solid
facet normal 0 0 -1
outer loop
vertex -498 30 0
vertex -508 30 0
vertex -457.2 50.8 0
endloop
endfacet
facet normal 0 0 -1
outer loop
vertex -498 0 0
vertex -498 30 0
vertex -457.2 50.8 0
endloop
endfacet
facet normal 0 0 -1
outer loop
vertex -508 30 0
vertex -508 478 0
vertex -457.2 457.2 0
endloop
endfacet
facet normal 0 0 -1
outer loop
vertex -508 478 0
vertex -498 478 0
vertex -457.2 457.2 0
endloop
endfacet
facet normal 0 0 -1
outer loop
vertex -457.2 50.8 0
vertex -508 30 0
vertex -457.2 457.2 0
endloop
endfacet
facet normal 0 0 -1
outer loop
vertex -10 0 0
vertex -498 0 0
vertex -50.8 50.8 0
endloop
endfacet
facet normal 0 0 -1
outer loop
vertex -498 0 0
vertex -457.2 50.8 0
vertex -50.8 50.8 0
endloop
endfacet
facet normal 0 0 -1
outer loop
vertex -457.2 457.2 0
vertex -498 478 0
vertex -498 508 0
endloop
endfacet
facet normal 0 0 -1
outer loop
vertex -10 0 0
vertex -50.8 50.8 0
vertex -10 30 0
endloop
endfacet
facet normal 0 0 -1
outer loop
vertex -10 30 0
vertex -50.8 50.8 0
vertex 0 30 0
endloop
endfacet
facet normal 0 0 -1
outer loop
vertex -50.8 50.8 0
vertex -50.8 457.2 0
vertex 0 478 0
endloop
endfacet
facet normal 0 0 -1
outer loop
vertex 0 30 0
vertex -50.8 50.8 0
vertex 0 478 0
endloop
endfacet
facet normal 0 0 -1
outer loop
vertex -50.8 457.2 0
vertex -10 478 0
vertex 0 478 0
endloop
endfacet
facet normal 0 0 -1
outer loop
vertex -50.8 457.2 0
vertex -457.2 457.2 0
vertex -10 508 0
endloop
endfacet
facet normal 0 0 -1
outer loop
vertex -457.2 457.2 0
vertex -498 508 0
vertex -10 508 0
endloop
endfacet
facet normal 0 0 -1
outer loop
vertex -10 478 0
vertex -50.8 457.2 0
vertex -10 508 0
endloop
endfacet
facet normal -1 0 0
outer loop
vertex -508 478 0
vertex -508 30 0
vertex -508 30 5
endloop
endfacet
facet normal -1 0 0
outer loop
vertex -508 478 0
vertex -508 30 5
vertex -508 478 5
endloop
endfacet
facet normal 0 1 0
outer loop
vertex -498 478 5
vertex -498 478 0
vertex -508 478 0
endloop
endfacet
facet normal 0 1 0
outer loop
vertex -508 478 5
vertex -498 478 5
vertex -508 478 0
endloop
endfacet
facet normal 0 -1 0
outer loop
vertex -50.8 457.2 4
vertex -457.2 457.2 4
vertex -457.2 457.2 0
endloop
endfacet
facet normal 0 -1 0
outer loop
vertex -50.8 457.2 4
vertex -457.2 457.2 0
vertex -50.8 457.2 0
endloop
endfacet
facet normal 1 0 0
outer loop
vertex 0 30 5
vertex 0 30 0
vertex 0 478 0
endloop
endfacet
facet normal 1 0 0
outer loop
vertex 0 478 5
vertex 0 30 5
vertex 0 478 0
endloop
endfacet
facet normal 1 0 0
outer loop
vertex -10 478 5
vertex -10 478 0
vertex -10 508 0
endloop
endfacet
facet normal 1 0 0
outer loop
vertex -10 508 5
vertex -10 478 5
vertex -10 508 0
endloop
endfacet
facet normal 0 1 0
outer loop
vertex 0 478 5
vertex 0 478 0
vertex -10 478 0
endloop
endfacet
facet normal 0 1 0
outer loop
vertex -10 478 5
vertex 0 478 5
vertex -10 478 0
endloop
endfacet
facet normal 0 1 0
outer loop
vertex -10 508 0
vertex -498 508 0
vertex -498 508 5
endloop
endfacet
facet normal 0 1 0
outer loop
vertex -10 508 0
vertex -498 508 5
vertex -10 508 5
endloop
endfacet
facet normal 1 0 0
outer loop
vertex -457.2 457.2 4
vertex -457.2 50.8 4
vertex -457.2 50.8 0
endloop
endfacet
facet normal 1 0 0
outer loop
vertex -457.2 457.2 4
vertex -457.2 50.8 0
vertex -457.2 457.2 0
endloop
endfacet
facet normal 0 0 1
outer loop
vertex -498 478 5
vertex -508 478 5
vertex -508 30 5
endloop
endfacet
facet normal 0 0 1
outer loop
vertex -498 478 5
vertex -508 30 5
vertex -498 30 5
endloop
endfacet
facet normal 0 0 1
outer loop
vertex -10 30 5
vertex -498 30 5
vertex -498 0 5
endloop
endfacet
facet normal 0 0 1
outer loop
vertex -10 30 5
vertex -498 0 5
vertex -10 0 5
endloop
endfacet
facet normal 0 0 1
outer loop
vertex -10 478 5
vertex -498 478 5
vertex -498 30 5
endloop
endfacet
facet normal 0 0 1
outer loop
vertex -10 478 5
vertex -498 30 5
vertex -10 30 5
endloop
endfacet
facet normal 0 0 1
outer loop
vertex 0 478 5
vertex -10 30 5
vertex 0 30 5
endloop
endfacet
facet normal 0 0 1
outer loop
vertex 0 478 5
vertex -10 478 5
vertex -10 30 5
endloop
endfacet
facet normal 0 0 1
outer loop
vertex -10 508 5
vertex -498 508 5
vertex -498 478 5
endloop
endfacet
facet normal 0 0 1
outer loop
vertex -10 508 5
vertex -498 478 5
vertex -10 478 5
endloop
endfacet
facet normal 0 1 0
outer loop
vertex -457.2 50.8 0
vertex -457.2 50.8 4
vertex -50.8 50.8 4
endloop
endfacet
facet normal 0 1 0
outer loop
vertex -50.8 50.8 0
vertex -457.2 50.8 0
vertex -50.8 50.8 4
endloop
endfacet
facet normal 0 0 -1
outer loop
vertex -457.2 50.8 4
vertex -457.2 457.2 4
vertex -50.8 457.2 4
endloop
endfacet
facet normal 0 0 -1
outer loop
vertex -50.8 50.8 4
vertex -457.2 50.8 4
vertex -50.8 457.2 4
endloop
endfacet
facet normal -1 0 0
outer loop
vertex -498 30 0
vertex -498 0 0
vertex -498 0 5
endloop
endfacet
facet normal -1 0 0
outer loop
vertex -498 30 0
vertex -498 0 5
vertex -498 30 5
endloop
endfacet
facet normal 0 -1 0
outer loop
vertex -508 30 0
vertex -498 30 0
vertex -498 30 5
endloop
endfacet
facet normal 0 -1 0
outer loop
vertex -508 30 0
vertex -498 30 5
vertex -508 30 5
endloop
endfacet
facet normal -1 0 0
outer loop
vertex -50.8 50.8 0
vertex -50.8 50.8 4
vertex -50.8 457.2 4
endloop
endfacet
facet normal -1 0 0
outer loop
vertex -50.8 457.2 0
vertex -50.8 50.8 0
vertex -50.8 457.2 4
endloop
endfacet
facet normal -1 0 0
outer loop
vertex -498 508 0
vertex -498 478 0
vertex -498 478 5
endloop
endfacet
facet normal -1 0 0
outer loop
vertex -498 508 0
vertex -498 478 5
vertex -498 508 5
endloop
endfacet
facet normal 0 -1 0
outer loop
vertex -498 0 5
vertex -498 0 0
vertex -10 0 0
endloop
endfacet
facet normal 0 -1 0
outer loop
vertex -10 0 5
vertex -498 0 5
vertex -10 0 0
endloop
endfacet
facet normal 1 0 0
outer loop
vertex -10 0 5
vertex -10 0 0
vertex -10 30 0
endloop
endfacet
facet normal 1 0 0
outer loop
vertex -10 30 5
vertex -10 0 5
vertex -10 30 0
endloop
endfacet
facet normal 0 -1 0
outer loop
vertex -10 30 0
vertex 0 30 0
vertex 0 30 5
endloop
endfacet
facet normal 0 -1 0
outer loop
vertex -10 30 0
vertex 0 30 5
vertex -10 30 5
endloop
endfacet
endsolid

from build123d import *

# Parameters (mm, degrees)
SKETCH1_W           = 508
SKETCH1_H           = 508
BOSS_EXTRUDE1_DEPTH = 4
SKETCH3_W           = 406.4
SKETCH3_H           = 406.4
CUT_EXTRUDE1_DEPTH  = 4
SKETCH4_W           = 508
SKETCH4_H           = 508
BOSS_EXTRUDE2_DEPTH = 1
SKETCH5_W           = 10
SKETCH5_H           = 30
CUT_EXTRUDE2_DEPTH  = 5


with BuildPart() as part:
    # Sketch1 → Boss-Extrude1 (new body)
    with BuildSketch(Plane.XY):
        with Locations((-254, 254)):
            Rectangle(SKETCH1_W, SKETCH1_H)
    extrude(amount=BOSS_EXTRUDE1_DEPTH)

    # Sketch3 → Cut-Extrude1 (cut)
    with BuildSketch(Plane.XY.offset(4)):
        with Locations((-254, 254)):
            Rectangle(SKETCH3_W, SKETCH3_H)
    extrude(amount=-CUT_EXTRUDE1_DEPTH, mode=Mode.SUBTRACT)

    # Sketch4 → Boss-Extrude2 (add)
    with BuildSketch(Plane.XY.offset(4)):
        with Locations((-254, 254)):
            Rectangle(SKETCH4_W, SKETCH4_H)
    extrude(amount=BOSS_EXTRUDE2_DEPTH)

    # Sketch5 → Cut-Extrude2 (cut)
    with BuildSketch(Plane(origin=(0, 0, 0), x_dir=(-1, 0, 0), z_dir=(0, 0, -1))):
        with Locations((5, 493)):
            Rectangle(SKETCH5_W, SKETCH5_H)
        with Locations((503, 493)):
            Rectangle(SKETCH5_W, SKETCH5_H)
        with Locations((503, 15)):
            Rectangle(SKETCH5_W, SKETCH5_H)
        with Locations((5, 15)):
            Rectangle(SKETCH5_W, SKETCH5_H)
    extrude(amount=-CUT_EXTRUDE2_DEPTH, mode=Mode.SUBTRACT)


solid = part.part
